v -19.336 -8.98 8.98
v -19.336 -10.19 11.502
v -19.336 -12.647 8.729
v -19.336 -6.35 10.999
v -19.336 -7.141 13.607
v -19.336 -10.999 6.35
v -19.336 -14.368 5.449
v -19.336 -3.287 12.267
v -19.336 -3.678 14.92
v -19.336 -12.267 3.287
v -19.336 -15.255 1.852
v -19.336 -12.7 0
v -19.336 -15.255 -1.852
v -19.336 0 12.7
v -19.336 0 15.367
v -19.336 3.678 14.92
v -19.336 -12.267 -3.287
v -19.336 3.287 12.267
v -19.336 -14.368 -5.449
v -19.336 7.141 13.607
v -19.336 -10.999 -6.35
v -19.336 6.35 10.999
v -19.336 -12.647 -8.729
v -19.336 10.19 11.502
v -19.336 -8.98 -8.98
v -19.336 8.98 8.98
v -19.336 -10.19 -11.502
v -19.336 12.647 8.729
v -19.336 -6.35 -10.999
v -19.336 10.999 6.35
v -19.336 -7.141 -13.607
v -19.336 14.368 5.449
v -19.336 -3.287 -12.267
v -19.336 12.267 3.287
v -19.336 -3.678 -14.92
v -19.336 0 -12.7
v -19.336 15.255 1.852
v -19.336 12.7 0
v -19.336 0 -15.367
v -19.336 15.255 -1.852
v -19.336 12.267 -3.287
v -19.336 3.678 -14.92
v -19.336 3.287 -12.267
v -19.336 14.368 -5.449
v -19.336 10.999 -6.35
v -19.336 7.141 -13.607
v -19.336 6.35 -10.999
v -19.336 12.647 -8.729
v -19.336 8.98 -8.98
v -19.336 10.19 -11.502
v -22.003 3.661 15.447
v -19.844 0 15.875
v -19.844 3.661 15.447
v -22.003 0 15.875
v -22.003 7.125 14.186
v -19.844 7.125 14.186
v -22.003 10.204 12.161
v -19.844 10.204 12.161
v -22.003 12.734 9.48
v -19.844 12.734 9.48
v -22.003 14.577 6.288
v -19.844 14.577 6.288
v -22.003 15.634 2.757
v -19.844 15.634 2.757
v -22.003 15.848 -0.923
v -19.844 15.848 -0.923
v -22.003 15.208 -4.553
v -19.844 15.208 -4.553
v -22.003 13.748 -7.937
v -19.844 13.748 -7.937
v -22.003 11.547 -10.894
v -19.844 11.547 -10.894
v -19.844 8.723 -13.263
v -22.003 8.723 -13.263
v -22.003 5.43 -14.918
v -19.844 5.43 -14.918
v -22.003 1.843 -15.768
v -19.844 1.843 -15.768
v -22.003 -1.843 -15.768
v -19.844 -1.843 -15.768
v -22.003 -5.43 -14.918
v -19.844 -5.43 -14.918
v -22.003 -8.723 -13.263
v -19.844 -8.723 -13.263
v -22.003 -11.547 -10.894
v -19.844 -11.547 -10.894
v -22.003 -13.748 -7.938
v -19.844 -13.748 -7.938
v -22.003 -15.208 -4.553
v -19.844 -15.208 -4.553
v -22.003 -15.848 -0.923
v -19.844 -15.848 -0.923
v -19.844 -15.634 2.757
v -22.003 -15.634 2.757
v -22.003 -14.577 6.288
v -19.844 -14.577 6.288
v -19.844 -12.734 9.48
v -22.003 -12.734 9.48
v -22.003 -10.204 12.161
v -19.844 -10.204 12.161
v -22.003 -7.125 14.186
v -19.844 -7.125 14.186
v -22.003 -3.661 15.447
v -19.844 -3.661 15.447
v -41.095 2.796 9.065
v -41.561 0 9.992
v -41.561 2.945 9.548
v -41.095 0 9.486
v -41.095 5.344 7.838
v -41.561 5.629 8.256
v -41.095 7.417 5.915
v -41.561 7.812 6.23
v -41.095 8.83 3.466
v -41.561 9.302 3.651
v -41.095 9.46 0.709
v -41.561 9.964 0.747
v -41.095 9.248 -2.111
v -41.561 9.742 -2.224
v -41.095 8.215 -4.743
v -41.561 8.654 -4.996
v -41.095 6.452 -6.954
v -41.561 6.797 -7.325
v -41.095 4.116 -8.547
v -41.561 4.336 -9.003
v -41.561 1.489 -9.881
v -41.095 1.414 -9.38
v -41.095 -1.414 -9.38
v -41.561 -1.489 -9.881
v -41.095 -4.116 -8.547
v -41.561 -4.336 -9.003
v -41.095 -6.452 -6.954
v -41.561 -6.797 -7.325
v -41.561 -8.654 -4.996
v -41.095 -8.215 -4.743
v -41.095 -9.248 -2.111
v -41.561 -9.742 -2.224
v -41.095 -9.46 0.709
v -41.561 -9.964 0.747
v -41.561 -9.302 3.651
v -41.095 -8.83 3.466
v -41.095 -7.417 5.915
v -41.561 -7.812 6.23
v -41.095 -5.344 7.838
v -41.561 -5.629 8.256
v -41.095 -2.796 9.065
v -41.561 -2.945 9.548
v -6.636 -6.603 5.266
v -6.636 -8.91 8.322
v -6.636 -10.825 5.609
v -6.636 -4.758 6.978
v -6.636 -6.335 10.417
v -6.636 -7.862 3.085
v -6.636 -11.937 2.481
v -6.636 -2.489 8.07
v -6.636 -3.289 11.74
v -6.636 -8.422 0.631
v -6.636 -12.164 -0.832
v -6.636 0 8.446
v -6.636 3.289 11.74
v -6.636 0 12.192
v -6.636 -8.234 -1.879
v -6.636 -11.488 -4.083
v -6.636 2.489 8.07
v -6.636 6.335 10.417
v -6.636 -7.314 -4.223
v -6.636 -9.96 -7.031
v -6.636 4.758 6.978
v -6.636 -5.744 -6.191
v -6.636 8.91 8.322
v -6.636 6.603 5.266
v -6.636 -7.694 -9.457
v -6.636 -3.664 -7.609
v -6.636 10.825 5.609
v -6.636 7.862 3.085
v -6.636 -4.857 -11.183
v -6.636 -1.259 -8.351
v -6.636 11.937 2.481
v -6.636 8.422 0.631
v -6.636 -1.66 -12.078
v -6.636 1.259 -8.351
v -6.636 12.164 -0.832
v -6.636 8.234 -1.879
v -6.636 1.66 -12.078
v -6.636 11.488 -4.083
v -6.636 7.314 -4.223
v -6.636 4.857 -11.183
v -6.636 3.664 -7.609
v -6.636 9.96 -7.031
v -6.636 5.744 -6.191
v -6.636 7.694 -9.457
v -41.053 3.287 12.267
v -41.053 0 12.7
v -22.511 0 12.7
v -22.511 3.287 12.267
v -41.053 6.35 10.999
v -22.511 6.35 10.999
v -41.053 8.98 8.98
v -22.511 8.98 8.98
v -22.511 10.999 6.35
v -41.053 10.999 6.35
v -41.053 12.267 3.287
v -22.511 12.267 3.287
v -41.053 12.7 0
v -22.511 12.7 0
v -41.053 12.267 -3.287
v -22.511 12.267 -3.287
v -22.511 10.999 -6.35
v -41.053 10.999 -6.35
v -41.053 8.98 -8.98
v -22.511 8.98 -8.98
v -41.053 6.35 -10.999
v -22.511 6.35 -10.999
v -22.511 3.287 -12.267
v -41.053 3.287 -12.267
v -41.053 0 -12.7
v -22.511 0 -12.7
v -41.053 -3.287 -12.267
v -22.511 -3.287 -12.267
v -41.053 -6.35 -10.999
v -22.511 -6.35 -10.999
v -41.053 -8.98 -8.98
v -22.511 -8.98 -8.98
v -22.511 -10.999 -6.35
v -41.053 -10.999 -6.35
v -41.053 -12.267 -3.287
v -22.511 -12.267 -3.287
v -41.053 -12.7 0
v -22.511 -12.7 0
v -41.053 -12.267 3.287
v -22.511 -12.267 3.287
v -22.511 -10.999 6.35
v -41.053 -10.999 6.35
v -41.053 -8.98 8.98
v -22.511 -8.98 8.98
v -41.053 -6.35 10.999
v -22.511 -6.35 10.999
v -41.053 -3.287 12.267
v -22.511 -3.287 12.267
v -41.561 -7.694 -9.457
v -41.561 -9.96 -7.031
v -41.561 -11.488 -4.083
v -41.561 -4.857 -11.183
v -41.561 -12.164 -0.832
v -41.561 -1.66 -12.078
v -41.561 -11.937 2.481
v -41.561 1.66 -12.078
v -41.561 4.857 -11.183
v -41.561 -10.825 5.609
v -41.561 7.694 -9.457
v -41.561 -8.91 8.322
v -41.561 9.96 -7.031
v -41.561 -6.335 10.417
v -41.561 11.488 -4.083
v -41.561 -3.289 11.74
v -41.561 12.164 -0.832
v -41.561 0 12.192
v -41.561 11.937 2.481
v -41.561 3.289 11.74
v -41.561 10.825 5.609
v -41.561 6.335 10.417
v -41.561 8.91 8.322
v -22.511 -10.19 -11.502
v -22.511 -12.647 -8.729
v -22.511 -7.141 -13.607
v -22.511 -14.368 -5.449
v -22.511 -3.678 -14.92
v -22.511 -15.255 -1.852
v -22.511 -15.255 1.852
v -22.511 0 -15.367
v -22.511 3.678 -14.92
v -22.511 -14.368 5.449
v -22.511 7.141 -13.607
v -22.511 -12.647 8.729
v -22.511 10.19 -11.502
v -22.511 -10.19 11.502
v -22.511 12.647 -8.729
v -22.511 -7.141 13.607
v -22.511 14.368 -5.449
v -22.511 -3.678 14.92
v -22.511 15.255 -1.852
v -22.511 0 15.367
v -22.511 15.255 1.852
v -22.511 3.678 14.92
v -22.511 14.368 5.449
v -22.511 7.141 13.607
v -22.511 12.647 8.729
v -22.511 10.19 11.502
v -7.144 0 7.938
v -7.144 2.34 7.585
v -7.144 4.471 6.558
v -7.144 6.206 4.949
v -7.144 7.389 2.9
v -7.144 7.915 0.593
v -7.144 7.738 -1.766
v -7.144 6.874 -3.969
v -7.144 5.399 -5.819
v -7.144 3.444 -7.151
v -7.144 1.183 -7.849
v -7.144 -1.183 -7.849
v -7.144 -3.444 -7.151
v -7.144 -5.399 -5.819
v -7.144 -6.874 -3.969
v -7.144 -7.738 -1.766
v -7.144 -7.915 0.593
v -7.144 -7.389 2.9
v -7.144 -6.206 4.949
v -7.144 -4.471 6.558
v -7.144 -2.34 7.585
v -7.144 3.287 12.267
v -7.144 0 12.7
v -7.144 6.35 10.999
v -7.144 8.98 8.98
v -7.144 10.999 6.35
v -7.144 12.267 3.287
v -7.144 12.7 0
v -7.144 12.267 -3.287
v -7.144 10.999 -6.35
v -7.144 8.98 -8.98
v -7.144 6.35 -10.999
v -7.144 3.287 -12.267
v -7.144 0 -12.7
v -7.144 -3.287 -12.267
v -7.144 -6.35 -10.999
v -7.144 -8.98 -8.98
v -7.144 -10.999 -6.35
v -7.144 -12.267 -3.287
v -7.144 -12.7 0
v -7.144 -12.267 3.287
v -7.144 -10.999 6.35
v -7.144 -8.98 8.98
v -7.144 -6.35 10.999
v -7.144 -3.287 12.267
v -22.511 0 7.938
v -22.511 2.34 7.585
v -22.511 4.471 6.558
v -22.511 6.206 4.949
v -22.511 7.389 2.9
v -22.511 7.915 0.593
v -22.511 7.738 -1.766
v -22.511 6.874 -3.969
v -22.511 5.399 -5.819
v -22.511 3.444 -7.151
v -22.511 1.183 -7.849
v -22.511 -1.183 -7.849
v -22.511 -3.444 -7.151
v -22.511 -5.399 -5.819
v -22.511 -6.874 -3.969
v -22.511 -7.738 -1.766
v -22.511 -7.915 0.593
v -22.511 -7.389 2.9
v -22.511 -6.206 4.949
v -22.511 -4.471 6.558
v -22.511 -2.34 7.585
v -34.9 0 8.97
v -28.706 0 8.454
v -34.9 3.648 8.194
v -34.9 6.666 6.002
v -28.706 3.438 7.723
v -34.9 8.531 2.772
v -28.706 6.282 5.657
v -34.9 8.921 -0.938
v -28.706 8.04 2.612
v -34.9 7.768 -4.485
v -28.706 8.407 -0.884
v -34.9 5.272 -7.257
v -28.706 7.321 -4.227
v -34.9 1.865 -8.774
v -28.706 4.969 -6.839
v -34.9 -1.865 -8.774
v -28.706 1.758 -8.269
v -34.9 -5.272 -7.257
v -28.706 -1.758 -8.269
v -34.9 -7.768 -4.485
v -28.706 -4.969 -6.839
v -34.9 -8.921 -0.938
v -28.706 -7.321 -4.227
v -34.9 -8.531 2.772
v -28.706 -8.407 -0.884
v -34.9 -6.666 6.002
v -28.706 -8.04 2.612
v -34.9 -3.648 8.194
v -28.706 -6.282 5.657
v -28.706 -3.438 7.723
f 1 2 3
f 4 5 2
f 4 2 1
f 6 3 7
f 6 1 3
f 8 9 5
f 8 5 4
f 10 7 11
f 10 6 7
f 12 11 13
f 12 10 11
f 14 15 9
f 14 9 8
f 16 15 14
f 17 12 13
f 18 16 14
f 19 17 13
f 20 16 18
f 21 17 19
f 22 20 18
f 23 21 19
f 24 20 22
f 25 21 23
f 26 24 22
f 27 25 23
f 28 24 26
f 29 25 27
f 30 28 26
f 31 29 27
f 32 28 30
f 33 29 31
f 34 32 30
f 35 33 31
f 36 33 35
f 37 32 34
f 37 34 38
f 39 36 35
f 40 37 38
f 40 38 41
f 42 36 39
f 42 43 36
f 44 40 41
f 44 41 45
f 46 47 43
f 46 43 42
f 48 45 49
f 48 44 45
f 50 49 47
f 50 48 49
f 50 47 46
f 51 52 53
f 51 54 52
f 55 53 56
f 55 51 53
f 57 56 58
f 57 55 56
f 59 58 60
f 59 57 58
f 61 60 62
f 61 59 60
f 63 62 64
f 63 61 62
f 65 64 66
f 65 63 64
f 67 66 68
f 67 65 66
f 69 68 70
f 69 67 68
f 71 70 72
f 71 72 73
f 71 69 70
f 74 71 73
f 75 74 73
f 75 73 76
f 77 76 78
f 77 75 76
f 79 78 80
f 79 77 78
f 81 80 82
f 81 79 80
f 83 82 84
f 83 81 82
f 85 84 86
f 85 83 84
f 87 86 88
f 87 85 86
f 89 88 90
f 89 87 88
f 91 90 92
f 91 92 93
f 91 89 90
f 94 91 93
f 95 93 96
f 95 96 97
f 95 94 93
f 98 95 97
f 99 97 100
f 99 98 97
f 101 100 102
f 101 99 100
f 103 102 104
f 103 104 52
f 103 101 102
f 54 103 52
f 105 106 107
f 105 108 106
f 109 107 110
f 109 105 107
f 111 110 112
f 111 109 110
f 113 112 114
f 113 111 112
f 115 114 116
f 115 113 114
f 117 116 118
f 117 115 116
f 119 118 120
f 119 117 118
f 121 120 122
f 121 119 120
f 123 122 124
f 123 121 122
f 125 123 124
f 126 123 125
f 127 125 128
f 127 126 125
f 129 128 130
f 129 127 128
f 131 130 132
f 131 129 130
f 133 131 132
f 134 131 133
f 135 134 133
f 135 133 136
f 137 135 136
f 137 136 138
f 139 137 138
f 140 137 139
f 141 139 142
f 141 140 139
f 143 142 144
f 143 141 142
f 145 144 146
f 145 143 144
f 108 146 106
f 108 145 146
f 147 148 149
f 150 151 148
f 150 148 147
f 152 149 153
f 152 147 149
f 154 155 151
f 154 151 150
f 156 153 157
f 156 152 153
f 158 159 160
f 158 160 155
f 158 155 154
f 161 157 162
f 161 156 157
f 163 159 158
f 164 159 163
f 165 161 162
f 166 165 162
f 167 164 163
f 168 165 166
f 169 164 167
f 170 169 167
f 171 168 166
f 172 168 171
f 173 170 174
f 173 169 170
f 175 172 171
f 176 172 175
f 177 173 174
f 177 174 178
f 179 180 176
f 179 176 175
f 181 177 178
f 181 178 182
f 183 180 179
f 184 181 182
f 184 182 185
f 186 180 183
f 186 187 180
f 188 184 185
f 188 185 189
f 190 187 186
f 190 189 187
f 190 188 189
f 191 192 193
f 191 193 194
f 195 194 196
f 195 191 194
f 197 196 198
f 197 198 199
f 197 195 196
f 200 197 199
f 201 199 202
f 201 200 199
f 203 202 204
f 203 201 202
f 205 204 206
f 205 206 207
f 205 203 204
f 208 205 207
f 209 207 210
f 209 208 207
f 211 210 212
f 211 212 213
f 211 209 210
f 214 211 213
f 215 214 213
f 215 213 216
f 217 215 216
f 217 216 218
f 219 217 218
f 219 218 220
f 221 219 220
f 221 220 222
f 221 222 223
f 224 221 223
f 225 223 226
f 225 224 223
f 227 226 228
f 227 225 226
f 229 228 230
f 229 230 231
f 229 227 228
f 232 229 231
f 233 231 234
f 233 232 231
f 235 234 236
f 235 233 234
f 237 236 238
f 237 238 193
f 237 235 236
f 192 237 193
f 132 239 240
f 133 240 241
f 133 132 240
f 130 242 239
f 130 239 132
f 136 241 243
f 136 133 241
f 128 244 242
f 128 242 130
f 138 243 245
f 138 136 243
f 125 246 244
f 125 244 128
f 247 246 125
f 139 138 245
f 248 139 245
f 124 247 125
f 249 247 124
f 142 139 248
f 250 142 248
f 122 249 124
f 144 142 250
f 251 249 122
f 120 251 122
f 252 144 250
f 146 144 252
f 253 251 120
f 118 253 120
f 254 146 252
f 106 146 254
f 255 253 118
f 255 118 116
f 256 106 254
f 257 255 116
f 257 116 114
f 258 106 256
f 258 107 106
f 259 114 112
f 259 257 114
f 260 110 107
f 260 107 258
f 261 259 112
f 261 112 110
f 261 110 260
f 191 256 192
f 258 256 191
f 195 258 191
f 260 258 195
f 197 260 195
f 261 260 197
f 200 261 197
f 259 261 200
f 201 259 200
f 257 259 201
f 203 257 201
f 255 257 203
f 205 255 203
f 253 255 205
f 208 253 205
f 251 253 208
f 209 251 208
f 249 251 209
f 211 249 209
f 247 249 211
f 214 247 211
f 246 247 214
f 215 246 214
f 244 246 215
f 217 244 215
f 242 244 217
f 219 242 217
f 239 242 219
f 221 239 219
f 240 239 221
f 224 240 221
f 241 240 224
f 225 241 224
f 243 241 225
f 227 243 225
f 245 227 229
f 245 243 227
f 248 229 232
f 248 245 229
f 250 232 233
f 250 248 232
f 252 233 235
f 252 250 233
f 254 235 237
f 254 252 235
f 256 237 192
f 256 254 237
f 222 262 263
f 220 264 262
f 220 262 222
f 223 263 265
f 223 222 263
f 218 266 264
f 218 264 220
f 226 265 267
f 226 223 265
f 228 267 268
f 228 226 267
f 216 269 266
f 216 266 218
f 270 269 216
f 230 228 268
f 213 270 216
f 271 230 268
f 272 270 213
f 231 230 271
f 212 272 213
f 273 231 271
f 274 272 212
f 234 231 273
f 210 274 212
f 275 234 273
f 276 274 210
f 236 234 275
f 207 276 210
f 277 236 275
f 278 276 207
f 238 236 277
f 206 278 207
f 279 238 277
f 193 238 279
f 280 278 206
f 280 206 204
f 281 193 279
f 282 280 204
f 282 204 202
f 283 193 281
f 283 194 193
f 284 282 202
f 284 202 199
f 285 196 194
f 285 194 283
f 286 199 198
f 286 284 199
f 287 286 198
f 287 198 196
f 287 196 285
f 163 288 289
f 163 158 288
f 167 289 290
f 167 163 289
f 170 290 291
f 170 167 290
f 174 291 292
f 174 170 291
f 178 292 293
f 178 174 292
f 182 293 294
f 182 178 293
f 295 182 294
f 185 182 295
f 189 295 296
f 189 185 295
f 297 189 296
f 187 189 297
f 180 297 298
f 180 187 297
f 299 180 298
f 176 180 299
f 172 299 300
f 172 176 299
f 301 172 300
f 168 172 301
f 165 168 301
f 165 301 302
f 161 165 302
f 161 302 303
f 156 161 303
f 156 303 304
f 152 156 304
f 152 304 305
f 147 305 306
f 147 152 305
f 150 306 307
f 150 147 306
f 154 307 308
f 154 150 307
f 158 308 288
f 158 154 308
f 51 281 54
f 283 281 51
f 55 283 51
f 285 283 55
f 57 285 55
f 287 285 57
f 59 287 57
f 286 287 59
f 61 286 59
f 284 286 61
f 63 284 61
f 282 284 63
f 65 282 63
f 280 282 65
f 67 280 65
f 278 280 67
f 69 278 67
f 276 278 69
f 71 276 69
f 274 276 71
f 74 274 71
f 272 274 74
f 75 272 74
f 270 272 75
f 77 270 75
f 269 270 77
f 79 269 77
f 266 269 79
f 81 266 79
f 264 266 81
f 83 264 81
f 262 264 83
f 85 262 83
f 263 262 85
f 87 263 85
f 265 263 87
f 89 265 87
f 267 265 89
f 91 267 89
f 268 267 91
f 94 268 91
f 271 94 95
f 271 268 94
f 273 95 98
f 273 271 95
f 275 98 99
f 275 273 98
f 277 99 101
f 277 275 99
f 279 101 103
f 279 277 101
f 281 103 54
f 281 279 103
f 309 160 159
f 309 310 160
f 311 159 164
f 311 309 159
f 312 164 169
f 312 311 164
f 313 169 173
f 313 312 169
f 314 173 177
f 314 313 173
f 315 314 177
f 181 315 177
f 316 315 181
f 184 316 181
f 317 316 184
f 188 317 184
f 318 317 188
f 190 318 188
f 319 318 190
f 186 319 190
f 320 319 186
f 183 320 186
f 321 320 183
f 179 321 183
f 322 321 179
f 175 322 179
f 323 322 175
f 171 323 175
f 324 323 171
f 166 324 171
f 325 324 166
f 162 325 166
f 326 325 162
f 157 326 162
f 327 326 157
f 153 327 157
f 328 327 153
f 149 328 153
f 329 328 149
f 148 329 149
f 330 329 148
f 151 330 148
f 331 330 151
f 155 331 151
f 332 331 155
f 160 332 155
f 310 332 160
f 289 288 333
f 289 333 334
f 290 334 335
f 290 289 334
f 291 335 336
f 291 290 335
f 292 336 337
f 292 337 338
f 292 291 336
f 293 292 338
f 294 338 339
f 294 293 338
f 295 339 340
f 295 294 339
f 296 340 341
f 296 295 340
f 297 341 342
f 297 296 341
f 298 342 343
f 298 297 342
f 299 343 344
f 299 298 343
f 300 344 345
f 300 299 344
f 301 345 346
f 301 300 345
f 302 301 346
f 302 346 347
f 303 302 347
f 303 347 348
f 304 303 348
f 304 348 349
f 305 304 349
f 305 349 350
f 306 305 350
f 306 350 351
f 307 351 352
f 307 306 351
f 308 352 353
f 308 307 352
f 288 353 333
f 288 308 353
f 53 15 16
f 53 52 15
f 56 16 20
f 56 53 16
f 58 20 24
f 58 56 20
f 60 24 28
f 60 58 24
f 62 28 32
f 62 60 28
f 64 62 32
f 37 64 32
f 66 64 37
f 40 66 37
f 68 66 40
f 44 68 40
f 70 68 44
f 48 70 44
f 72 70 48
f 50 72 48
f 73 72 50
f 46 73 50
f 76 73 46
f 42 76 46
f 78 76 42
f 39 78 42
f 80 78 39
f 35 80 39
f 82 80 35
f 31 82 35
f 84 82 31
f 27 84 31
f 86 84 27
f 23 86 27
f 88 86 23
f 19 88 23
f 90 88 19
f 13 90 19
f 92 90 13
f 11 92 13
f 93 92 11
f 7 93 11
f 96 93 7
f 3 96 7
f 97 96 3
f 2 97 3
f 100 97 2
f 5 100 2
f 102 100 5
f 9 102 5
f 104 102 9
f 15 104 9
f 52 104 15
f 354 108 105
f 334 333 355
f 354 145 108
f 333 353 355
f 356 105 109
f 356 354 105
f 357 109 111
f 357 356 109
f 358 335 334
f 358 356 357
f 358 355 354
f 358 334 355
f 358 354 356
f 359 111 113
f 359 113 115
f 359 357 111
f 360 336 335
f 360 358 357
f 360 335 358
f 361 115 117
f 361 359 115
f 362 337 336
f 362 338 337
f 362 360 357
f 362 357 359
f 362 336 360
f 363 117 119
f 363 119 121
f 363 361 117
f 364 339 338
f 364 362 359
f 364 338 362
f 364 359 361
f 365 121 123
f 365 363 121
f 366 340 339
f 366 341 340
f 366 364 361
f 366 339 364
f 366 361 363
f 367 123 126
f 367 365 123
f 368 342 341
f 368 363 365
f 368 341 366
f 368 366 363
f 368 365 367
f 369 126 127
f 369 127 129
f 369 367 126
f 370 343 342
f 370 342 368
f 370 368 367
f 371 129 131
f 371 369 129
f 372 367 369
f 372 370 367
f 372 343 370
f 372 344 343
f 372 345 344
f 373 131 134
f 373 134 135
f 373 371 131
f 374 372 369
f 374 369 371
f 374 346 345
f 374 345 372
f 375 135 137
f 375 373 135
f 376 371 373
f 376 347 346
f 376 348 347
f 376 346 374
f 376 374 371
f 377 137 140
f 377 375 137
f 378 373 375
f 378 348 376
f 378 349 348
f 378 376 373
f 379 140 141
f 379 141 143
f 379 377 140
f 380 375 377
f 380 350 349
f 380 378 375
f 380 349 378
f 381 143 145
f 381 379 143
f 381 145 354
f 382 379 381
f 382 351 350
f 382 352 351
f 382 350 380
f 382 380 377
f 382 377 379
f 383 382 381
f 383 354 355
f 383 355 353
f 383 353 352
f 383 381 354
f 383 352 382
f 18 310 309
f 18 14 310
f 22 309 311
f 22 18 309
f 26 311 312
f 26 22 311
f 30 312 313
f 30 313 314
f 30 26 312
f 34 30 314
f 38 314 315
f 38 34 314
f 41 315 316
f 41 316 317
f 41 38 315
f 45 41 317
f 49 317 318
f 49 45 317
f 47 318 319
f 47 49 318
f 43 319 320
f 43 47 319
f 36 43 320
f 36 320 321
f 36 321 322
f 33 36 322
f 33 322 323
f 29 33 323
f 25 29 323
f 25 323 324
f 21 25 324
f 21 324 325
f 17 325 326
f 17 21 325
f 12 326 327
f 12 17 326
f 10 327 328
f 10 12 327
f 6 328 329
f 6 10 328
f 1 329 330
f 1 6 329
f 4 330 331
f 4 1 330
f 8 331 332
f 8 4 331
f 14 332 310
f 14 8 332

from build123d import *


# Not quite as in the source:
# - a fillet or chamfer that OpenCascade refuses, or shapes differently, is made with other operations: its cross-section is extruded or revolved along the edge and cut away or added


with BuildPart() as f1:
    # F0 (on Front) → F1 (revolve)
    with BuildSketch(Plane.XZ):
        Polygon((-22.5108576886, 12.7), (-41.5608576886, 12.7), (-41.5608576886, 9.525), (-22.5108576886, 7.9375), (-6.6358576886, 7.9375), (-6.6358576886, 12.7), (-19.3358576886, 12.7), (-19.3358576886, 15.875), (-22.5108576886, 15.875), align=None)
    revolve(axis=Axis((-22.7388739586, 0, 0), (-1, 0, 0)))

    # F2: chamfer of 0.508 on 6 edges, made by hand

    # F2_s1 → F2_t2 (revolve, cut)
    with BuildSketch(Plane.XZ):
        Polygon((-22.0028576886, 15.875), (-22.5108576886, 15.367), (-22.5108576886, 15.875), align=None)
    revolve(axis=Axis((-22.5108576886, 0, 0), (-1, 0, 0)), mode=Mode.SUBTRACT)

    # F2_s3 → F2_t4 (revolve, cut)
    with BuildSketch(Plane.XZ):
        Polygon((-19.3358576886, 15.367), (-19.8438576886, 15.875), (-19.3358576886, 15.875), align=None)
    revolve(axis=Axis((-19.3358576886, 0, 0), (-1, 0, 0)), mode=Mode.SUBTRACT)

    # F2_s5 → F2_t6 (revolve, cut)
    with BuildSketch(Plane.XZ):
        Polygon((-41.0528576886, 12.7), (-41.5608576886, 12.192), (-41.5608576886, 12.7), align=None)
    revolve(axis=Axis((-41.5608576886, 0, 0), (-1, 0, 0)), mode=Mode.SUBTRACT)

    # F2_s7 → F2_t8 (revolve, cut)
    with BuildSketch(Plane.XZ):
        Polygon((-6.6358576886, 12.192), (-7.1438576886, 12.7), (-6.6358576886, 12.7), align=None)
    revolve(axis=Axis((-6.6358576886, 0, 0), (-1, 0, 0)), mode=Mode.SUBTRACT)

    # F2_s9 → F2_t10 (revolve, cut)
    with BuildSketch(Plane.XZ):
        Polygon((-41.5608576886, 9.9924275038), (-41.0950447924, 9.4861822586), (-41.5608576886, 9.525), align=None)
    revolve(axis=Axis((-41.5608576886, 0, 0), (-1, 0, 0)), mode=Mode.SUBTRACT)

    # F2_s11 → F2_t12 (revolve, cut)
    with BuildSketch(Plane.XZ):
        Polygon((-7.1438576886, 7.9375), (-6.6358576886, 8.4455), (-6.6358576886, 7.9375), align=None)
    revolve(axis=Axis((-6.6358576886, 0, 0), (-1, 0, 0)), mode=Mode.SUBTRACT)


solid = f1.part
